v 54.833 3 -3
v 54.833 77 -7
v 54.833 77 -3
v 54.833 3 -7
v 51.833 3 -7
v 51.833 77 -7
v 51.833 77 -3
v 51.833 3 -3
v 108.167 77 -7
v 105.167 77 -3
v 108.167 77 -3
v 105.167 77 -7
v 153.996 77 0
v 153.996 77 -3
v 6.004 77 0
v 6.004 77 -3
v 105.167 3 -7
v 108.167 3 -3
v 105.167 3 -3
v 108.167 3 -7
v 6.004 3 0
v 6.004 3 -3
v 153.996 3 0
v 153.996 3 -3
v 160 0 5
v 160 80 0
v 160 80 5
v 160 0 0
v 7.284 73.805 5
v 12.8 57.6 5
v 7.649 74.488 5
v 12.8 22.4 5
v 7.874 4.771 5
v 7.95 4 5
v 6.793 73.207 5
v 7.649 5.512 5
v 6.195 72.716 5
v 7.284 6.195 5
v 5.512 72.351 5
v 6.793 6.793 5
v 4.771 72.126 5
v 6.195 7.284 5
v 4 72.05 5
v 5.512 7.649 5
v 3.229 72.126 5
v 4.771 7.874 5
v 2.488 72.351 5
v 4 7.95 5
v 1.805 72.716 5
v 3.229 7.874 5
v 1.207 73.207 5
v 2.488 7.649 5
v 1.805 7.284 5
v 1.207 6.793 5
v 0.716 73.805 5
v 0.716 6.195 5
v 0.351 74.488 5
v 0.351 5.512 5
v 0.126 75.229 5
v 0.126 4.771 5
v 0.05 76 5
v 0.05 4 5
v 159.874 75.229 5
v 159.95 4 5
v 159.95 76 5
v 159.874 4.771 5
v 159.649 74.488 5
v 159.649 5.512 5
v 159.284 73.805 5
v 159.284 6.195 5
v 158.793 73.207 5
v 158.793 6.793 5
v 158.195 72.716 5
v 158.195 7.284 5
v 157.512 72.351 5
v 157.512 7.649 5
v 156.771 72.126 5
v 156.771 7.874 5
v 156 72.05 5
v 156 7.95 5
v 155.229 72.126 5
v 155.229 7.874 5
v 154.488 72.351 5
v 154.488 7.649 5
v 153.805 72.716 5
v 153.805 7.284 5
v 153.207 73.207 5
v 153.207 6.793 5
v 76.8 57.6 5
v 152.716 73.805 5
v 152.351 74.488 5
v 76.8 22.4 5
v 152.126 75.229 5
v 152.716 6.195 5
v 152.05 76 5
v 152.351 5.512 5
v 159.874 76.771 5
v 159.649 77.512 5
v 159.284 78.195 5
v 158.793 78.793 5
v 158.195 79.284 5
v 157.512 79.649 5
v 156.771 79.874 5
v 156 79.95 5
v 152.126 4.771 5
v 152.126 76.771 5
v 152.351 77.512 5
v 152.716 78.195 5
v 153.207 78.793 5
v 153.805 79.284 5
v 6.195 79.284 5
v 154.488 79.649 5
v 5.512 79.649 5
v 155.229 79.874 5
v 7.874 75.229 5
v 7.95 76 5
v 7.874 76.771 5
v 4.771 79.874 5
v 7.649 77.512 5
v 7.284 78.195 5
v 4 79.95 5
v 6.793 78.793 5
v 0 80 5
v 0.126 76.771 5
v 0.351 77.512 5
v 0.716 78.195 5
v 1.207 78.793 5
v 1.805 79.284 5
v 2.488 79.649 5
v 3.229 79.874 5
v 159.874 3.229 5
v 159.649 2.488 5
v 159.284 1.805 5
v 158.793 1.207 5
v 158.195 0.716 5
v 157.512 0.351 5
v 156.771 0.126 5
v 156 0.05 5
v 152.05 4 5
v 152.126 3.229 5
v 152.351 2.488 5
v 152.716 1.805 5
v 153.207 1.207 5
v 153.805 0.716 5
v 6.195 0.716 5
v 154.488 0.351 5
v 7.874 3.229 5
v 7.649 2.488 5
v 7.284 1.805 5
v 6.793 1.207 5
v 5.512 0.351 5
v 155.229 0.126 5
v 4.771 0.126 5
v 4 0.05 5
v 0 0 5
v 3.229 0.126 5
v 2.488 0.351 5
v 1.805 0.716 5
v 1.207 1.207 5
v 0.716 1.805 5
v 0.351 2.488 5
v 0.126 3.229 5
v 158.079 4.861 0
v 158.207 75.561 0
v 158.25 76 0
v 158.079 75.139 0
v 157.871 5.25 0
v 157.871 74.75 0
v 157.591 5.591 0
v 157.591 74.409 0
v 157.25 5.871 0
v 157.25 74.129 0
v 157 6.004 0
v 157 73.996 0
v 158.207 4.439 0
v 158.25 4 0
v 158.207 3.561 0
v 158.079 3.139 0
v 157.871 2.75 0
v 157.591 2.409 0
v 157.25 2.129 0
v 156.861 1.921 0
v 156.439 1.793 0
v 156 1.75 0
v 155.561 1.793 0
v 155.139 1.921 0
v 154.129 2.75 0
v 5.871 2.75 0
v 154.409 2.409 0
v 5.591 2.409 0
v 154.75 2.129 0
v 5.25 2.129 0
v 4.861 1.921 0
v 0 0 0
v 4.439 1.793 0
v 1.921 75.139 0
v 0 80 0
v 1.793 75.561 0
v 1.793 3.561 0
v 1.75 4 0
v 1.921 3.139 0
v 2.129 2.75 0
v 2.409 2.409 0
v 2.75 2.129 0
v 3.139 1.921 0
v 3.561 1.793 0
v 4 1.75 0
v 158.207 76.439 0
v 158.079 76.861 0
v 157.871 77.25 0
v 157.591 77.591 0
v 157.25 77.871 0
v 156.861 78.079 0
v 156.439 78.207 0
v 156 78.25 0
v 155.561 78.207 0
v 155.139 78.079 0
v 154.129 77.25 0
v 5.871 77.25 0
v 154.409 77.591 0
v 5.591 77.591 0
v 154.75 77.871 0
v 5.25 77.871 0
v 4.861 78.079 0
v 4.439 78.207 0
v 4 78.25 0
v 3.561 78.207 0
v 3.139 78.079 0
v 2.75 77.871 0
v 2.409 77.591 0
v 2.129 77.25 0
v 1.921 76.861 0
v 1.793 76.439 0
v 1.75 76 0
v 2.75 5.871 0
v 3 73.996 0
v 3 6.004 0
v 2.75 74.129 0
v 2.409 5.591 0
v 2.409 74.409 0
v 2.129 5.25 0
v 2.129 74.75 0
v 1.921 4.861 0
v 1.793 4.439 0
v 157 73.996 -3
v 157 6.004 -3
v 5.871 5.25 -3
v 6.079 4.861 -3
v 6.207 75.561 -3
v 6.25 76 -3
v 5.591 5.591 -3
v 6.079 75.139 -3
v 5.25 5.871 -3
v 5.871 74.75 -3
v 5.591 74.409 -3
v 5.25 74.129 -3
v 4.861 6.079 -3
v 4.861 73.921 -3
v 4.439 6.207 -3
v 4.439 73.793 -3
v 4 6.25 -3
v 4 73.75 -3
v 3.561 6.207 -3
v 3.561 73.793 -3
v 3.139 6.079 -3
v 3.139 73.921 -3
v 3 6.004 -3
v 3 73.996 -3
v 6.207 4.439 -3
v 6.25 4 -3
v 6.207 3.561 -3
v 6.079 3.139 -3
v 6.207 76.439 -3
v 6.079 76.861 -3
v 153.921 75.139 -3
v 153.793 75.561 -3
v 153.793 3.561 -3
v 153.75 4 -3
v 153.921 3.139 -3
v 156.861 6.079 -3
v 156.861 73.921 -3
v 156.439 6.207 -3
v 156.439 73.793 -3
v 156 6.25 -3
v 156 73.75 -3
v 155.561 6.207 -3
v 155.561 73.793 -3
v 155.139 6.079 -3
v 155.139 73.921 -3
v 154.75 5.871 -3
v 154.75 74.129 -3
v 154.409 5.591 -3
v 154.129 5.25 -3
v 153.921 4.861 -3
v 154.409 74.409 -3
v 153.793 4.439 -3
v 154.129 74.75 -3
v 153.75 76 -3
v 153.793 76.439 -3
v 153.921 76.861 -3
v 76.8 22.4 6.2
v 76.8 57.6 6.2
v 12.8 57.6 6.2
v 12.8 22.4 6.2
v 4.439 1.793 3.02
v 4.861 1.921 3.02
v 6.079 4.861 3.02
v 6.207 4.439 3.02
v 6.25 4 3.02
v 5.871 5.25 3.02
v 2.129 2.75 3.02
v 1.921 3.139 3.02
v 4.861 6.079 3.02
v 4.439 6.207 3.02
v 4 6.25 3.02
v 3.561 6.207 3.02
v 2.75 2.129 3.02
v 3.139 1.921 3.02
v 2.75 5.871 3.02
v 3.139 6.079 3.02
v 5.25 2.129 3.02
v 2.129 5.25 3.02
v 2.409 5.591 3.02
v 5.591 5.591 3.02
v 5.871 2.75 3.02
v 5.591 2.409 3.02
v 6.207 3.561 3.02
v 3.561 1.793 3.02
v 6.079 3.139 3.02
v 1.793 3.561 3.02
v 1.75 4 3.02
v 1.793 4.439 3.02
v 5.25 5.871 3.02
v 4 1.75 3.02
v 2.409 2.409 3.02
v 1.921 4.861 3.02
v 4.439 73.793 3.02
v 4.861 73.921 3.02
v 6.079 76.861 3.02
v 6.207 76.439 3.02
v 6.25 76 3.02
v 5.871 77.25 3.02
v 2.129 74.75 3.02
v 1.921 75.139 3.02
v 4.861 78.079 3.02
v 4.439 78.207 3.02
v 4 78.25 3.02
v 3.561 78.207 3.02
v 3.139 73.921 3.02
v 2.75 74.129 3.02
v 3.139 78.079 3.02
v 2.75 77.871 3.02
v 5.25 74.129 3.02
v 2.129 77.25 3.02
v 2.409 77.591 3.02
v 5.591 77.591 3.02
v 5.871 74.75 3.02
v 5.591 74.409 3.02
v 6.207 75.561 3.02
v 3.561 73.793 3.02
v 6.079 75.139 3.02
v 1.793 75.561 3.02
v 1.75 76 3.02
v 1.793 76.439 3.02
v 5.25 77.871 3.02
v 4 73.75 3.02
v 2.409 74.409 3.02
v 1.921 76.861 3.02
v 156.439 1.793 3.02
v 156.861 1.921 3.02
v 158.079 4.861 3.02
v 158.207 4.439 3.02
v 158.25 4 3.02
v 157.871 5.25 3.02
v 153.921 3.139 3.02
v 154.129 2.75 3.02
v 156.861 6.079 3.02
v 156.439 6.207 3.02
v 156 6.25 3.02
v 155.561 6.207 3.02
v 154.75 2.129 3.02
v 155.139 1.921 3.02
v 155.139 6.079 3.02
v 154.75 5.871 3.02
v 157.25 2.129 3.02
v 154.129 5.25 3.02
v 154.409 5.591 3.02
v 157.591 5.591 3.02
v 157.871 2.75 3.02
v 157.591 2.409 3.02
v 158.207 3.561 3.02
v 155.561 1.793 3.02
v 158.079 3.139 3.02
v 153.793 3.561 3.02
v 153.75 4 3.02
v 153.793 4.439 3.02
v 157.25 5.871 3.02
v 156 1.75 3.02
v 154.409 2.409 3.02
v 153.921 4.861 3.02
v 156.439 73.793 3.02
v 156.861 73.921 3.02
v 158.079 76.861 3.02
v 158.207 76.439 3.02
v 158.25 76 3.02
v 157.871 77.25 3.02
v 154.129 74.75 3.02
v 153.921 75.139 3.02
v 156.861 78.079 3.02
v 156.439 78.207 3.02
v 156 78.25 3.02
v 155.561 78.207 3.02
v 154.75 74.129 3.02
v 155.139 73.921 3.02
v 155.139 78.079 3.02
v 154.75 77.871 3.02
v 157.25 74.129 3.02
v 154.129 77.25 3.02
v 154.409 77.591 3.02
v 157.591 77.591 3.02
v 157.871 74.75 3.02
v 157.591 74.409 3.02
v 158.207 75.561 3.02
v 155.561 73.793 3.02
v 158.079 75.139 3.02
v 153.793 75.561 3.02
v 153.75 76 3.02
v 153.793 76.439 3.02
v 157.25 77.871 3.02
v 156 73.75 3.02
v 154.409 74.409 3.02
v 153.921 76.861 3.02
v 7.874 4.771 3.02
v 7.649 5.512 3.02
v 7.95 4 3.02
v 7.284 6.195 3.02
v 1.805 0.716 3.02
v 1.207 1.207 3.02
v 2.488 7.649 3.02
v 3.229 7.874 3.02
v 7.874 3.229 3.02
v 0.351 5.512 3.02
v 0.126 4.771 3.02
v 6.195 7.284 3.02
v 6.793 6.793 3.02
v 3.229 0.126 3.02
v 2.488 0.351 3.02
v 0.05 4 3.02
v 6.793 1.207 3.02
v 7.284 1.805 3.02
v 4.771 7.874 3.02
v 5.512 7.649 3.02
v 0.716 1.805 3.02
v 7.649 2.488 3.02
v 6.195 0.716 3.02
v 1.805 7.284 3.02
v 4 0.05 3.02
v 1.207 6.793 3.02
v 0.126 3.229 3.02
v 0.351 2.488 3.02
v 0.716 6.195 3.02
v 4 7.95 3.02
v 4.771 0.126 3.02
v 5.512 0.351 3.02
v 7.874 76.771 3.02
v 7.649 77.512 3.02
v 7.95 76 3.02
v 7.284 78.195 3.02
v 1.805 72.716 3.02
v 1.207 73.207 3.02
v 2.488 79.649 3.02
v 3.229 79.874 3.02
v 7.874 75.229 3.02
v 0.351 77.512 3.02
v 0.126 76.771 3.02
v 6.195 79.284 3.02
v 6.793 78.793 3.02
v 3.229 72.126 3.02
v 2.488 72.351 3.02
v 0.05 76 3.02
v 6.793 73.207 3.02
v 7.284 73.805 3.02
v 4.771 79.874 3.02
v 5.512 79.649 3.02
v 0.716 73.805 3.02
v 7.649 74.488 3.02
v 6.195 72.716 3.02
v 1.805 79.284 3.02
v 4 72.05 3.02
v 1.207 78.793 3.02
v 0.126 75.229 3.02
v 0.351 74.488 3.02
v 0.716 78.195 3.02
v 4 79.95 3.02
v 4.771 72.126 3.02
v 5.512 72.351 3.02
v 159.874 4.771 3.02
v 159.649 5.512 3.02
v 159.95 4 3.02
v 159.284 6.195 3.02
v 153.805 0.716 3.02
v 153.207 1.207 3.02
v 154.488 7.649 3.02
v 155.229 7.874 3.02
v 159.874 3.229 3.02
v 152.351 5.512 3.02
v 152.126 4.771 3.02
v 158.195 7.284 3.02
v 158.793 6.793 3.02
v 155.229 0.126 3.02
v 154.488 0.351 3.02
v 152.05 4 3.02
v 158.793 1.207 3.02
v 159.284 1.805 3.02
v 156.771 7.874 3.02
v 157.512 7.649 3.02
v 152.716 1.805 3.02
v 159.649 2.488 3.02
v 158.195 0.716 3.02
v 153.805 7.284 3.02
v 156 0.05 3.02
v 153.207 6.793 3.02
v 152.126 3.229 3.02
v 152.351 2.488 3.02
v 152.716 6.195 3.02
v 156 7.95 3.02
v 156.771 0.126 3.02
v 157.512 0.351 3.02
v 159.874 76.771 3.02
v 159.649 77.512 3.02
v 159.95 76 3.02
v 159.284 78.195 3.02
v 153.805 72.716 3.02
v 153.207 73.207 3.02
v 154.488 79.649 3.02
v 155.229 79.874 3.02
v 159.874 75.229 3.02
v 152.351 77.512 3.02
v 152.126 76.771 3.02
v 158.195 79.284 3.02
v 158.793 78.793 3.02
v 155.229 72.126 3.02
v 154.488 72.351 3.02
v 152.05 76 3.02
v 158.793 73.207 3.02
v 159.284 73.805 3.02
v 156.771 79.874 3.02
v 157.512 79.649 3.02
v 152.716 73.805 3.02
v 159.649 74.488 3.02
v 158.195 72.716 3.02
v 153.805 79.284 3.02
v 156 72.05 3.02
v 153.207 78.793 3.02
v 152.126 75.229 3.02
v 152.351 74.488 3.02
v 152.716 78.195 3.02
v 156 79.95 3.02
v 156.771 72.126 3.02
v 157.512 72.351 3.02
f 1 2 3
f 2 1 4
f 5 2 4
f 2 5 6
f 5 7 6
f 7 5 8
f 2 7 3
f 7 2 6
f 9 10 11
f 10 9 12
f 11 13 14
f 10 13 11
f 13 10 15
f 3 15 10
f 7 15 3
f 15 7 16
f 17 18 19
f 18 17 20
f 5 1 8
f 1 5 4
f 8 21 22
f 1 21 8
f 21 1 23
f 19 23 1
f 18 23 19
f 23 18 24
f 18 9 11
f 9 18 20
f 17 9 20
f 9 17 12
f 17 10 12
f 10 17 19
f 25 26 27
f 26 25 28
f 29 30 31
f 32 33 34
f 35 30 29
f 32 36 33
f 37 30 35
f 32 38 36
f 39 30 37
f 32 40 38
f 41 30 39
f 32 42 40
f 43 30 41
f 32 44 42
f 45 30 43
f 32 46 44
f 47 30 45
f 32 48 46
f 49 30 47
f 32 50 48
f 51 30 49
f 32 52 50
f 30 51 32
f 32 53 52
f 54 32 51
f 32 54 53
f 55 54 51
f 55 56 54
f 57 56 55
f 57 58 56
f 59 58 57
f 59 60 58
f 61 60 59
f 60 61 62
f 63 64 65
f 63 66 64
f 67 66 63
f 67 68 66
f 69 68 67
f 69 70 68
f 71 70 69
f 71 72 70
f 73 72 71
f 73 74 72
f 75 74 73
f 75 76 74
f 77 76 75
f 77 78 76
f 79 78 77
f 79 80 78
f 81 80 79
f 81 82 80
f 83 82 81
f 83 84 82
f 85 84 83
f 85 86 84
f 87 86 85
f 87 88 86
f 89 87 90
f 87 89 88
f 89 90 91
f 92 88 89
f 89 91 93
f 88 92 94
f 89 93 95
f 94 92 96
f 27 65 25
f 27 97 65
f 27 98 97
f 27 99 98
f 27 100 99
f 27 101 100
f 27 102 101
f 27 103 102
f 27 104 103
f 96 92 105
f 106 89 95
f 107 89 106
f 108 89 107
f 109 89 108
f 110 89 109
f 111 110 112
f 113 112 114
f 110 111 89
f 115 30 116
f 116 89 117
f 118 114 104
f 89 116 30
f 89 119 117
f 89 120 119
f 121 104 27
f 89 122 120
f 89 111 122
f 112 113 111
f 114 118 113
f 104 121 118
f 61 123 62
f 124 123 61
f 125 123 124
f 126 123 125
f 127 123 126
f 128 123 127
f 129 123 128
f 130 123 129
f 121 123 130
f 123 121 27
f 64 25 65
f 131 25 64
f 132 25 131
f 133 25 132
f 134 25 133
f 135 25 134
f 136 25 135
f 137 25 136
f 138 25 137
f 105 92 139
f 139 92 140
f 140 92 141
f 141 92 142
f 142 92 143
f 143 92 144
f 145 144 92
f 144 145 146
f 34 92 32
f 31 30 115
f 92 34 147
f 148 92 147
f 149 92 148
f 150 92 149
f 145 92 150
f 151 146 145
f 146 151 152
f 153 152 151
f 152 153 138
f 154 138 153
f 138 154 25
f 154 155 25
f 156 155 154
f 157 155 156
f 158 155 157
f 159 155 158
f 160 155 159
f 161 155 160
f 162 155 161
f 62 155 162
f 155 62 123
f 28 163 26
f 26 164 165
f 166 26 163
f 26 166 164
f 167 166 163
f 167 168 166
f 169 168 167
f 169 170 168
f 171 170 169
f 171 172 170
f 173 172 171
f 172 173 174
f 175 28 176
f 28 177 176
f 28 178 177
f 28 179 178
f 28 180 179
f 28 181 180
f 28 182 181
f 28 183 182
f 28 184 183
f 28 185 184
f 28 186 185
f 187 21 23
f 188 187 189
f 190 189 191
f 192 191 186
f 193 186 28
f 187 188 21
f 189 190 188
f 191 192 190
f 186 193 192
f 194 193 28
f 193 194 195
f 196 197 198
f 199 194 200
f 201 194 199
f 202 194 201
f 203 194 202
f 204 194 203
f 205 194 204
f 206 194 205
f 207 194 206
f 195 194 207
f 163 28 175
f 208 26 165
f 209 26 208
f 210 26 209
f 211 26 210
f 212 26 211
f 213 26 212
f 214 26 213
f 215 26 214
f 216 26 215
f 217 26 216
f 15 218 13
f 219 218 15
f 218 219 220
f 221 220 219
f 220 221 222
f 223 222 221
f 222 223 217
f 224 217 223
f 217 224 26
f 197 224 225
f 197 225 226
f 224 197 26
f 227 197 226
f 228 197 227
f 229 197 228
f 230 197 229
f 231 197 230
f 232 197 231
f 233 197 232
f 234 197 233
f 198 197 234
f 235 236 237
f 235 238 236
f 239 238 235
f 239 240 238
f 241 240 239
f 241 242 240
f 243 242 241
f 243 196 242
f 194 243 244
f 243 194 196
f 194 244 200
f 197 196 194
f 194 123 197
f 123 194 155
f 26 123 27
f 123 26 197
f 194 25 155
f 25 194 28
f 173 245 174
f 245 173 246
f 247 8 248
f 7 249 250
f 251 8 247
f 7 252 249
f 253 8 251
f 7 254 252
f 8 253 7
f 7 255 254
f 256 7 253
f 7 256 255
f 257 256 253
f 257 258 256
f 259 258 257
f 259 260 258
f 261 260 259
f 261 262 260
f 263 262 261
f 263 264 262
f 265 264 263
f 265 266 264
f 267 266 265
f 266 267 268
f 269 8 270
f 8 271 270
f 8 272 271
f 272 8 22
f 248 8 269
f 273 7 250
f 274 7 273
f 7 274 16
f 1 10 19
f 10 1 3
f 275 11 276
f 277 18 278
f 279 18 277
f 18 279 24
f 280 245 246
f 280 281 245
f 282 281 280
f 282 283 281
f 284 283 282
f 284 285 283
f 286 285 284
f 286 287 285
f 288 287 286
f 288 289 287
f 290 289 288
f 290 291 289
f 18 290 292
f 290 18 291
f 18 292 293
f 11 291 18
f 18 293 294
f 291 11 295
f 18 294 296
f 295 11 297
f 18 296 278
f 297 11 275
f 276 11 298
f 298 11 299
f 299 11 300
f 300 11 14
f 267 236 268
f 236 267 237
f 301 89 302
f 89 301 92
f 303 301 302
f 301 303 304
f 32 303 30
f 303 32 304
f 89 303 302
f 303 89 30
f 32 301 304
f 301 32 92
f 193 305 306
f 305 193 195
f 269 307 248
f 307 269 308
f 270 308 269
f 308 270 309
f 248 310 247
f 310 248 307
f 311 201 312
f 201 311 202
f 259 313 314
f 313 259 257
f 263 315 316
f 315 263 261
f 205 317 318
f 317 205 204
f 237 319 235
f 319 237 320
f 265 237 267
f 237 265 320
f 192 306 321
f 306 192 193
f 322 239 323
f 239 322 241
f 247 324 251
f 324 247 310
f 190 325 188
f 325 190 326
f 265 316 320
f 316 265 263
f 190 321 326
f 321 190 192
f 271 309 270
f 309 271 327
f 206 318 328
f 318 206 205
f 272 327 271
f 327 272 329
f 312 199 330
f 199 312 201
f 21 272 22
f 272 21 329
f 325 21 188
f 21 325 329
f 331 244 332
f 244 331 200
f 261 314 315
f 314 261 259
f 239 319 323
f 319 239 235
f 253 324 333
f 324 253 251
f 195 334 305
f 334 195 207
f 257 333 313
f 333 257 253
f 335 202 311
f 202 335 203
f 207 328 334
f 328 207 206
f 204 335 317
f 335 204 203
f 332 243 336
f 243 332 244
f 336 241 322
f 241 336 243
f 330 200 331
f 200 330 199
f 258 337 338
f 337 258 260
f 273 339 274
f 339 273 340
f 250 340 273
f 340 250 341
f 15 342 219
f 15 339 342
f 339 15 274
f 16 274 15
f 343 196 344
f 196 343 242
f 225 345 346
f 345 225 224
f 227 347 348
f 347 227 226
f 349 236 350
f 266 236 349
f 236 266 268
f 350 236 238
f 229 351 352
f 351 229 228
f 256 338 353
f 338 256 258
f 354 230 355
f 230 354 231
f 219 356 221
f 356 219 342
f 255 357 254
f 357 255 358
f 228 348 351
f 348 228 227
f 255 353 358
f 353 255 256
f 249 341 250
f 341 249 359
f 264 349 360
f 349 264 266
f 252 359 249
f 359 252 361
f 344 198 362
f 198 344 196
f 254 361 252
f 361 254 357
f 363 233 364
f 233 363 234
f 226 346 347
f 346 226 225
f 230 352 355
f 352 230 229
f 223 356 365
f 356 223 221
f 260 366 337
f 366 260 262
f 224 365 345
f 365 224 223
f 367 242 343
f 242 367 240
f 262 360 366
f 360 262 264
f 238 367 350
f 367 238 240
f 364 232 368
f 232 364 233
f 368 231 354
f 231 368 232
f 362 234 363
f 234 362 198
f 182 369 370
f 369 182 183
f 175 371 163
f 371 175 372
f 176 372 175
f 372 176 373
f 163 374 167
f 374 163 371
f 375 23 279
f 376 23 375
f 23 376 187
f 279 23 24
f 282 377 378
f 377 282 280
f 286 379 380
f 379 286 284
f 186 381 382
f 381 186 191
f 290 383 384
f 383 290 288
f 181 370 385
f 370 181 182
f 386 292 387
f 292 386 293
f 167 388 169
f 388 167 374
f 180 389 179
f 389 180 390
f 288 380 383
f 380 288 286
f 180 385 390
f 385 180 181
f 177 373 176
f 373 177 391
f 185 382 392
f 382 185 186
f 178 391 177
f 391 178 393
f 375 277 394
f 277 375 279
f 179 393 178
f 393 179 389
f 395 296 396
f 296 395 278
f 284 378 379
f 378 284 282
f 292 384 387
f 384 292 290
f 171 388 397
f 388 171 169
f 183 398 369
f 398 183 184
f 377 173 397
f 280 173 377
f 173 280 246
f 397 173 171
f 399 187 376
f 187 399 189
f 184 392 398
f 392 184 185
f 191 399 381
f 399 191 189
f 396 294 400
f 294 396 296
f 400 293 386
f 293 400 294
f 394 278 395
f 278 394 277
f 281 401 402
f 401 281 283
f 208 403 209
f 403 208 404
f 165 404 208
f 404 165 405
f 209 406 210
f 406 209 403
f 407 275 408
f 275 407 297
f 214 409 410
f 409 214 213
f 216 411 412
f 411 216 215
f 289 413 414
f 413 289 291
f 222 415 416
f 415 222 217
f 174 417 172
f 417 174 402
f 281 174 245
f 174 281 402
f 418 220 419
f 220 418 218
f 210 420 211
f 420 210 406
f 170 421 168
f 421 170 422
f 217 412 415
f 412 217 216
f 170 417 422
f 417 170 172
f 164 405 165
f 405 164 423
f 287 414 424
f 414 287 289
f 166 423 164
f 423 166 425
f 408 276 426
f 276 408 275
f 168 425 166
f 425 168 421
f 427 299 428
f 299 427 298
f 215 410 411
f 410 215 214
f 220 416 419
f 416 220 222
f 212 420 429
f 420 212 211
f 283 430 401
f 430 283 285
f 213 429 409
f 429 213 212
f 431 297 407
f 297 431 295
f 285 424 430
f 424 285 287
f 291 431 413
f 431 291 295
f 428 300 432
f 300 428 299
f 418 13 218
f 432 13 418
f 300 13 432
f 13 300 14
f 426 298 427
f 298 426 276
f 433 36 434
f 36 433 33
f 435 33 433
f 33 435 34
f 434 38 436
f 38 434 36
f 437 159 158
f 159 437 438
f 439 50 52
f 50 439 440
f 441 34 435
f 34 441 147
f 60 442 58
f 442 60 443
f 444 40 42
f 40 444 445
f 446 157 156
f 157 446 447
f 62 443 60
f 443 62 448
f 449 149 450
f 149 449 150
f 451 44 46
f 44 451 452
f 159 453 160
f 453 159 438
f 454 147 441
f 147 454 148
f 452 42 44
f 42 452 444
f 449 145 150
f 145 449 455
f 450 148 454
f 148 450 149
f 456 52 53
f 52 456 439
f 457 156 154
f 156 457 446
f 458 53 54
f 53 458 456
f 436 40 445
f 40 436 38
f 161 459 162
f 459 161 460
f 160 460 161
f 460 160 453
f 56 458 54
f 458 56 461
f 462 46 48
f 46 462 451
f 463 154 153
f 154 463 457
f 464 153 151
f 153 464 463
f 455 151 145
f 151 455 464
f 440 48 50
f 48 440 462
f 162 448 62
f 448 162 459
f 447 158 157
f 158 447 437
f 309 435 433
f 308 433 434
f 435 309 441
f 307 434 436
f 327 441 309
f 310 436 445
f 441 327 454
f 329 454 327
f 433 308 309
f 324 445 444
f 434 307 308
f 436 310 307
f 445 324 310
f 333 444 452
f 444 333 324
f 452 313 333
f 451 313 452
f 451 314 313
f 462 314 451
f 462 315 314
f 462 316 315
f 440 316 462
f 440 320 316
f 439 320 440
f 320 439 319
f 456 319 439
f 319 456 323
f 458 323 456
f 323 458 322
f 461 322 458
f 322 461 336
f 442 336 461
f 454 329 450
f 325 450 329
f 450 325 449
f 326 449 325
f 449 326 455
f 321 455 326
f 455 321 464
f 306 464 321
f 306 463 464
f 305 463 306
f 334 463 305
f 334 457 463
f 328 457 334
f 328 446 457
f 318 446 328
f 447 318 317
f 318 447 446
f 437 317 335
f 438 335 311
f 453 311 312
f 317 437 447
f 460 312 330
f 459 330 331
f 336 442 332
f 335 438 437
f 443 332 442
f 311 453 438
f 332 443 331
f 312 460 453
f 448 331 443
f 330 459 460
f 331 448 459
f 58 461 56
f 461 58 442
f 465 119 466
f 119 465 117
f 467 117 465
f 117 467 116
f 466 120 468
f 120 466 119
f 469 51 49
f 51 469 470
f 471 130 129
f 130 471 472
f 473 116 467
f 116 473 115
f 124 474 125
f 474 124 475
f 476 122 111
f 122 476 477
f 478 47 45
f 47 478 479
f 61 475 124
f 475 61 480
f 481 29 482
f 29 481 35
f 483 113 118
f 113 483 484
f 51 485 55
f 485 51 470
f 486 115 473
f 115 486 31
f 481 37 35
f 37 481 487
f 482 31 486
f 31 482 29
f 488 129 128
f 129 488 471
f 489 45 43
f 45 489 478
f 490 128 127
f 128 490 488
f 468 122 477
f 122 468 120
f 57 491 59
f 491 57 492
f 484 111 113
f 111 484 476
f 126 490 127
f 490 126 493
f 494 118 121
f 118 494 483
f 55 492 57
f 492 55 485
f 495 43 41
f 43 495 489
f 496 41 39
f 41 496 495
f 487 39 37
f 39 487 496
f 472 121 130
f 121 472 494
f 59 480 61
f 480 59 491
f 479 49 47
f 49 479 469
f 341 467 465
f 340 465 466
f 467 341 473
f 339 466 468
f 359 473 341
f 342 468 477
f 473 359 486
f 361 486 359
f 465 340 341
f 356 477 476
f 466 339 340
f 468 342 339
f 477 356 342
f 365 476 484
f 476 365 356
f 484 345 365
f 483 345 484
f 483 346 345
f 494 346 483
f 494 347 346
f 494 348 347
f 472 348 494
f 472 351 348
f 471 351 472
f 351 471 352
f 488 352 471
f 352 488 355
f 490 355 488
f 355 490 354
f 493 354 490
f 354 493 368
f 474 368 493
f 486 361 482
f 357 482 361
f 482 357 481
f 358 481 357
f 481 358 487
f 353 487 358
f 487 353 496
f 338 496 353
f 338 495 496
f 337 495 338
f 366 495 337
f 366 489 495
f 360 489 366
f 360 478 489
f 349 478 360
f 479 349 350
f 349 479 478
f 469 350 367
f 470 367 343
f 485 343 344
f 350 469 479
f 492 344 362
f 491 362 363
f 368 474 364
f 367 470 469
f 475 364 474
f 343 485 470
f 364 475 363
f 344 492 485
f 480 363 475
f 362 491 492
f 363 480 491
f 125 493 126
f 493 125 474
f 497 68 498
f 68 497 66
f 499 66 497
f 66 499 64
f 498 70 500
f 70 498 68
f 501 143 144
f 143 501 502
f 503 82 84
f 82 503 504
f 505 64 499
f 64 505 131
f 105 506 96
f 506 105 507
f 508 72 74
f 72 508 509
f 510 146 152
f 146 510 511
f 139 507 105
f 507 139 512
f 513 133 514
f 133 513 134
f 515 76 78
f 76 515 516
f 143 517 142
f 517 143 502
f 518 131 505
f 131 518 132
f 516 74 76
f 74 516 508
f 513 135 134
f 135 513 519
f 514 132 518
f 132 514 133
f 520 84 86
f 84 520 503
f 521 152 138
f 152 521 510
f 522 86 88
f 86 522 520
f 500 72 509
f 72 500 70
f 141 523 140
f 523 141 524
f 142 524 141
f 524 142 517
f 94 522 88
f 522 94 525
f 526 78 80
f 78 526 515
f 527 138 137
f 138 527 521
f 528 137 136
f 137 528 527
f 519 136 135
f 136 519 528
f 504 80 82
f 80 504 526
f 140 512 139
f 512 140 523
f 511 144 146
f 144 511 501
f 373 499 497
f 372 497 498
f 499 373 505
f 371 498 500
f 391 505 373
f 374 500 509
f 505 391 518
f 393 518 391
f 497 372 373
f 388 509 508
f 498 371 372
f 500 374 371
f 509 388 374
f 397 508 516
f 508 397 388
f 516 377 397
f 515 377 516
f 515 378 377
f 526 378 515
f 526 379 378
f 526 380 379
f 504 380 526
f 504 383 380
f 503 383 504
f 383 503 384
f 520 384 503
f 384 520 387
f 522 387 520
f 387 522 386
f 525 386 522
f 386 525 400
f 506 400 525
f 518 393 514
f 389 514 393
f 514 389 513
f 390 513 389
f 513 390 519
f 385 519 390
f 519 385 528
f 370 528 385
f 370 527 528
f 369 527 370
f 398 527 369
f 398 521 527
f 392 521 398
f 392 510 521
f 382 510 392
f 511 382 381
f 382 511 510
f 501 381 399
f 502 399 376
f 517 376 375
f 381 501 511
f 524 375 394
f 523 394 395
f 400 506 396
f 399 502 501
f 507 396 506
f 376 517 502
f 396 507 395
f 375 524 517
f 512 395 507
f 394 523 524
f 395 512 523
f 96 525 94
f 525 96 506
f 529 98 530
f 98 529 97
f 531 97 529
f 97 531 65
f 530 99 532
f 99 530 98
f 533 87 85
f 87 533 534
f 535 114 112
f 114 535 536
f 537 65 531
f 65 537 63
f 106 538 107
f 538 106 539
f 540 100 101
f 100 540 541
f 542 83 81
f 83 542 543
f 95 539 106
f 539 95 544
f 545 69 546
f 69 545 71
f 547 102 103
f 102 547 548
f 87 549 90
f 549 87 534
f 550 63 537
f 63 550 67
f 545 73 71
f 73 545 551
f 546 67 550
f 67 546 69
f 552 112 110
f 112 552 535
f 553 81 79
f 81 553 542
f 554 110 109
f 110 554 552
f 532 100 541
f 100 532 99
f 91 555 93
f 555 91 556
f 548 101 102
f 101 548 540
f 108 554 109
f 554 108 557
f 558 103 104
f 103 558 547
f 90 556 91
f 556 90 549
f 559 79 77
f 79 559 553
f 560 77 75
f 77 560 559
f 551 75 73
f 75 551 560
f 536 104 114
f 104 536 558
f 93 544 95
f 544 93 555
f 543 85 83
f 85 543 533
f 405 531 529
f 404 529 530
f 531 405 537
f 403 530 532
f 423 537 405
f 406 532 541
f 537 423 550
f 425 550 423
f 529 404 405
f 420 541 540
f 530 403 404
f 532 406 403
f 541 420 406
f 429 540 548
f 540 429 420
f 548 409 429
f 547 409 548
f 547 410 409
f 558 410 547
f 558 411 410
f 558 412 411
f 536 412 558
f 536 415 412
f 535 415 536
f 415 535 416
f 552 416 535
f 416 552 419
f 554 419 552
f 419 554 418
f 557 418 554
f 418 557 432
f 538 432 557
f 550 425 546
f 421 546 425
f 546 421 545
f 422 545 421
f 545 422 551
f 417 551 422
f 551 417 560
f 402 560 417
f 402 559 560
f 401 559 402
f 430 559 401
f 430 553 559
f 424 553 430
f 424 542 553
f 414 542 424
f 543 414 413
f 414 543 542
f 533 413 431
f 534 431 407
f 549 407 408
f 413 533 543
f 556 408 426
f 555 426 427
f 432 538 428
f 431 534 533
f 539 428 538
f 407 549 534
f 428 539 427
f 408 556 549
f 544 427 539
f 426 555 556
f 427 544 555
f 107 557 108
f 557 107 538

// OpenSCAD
$fn = 32;

// ----------------------------------------------------------------------
// Enclosure lid: 160 x 80 x 5 mm, 4 bolt holes
// ----------------------------------------------------------------------

// --- parameters (mm) ---
length = 160;             // lid length, X
width = 80;               // lid width, Y
plate_t = 5;              // lid plate thickness
bolt_d = 4.5;             // bolt clearance
boss_lip = 4;             // bolt hole inset from the corner
sink = 1;                 // overlap of the lip and ribs into the plate
lip_h = 4;                // lip height below the plate
lip_wall = 3;             // lip wall thickness
cs_d = 7.9;               // countersink diameter
cs_h = 1.98;              // countersink depth
rib_n = 2;                // stiffening ribs
rib_t = 3;                // rib thickness
rib_h = 8;                // rib height below the plate
label_h = 1.2;            // raised marking pad

module plate() {
  cube([length, width, plate_t]);
  /* lip that drops into the housing opening, sunk into the plate */
  translate([lip_wall, lip_wall, -lip_h + sink]) cube([length - 2 * lip_wall, width - 2 * lip_wall, lip_h]);
  /* stiffening ribs under the plate */
  for (i = [1 : rib_n]) translate([length * i / (rib_n + 1) - rib_t / 2, lip_wall, -rib_h + sink]) cube([rib_t, width - 2 * lip_wall, rib_h]);
  /* raised marking pad on top, sunk 1 mm into the plate */
  translate([length * 0.08, width * 0.28, plate_t - 1]) cube([length * 0.4, width * 0.44, label_h + 1]);
}

difference() {
  plate();
  /* bolt pattern matching the corner bosses */
  for (sx = [0, 1]) for (sy = [0, 1])
    translate([sx * (length - 2 * boss_lip) + boss_lip, sy * (width - 2 * boss_lip) + boss_lip, -lip_h - 1])
      cylinder(h = plate_t + lip_h + 2, d = bolt_d);
  /* countersinks so the heads sit flush */
  for (sx = [0, 1]) for (sy = [0, 1])
    translate([sx * (length - 2 * boss_lip) + boss_lip, sy * (width - 2 * boss_lip) + boss_lip, plate_t - cs_h])
      cylinder(h = cs_h + 0.5, d = cs_d);
}
